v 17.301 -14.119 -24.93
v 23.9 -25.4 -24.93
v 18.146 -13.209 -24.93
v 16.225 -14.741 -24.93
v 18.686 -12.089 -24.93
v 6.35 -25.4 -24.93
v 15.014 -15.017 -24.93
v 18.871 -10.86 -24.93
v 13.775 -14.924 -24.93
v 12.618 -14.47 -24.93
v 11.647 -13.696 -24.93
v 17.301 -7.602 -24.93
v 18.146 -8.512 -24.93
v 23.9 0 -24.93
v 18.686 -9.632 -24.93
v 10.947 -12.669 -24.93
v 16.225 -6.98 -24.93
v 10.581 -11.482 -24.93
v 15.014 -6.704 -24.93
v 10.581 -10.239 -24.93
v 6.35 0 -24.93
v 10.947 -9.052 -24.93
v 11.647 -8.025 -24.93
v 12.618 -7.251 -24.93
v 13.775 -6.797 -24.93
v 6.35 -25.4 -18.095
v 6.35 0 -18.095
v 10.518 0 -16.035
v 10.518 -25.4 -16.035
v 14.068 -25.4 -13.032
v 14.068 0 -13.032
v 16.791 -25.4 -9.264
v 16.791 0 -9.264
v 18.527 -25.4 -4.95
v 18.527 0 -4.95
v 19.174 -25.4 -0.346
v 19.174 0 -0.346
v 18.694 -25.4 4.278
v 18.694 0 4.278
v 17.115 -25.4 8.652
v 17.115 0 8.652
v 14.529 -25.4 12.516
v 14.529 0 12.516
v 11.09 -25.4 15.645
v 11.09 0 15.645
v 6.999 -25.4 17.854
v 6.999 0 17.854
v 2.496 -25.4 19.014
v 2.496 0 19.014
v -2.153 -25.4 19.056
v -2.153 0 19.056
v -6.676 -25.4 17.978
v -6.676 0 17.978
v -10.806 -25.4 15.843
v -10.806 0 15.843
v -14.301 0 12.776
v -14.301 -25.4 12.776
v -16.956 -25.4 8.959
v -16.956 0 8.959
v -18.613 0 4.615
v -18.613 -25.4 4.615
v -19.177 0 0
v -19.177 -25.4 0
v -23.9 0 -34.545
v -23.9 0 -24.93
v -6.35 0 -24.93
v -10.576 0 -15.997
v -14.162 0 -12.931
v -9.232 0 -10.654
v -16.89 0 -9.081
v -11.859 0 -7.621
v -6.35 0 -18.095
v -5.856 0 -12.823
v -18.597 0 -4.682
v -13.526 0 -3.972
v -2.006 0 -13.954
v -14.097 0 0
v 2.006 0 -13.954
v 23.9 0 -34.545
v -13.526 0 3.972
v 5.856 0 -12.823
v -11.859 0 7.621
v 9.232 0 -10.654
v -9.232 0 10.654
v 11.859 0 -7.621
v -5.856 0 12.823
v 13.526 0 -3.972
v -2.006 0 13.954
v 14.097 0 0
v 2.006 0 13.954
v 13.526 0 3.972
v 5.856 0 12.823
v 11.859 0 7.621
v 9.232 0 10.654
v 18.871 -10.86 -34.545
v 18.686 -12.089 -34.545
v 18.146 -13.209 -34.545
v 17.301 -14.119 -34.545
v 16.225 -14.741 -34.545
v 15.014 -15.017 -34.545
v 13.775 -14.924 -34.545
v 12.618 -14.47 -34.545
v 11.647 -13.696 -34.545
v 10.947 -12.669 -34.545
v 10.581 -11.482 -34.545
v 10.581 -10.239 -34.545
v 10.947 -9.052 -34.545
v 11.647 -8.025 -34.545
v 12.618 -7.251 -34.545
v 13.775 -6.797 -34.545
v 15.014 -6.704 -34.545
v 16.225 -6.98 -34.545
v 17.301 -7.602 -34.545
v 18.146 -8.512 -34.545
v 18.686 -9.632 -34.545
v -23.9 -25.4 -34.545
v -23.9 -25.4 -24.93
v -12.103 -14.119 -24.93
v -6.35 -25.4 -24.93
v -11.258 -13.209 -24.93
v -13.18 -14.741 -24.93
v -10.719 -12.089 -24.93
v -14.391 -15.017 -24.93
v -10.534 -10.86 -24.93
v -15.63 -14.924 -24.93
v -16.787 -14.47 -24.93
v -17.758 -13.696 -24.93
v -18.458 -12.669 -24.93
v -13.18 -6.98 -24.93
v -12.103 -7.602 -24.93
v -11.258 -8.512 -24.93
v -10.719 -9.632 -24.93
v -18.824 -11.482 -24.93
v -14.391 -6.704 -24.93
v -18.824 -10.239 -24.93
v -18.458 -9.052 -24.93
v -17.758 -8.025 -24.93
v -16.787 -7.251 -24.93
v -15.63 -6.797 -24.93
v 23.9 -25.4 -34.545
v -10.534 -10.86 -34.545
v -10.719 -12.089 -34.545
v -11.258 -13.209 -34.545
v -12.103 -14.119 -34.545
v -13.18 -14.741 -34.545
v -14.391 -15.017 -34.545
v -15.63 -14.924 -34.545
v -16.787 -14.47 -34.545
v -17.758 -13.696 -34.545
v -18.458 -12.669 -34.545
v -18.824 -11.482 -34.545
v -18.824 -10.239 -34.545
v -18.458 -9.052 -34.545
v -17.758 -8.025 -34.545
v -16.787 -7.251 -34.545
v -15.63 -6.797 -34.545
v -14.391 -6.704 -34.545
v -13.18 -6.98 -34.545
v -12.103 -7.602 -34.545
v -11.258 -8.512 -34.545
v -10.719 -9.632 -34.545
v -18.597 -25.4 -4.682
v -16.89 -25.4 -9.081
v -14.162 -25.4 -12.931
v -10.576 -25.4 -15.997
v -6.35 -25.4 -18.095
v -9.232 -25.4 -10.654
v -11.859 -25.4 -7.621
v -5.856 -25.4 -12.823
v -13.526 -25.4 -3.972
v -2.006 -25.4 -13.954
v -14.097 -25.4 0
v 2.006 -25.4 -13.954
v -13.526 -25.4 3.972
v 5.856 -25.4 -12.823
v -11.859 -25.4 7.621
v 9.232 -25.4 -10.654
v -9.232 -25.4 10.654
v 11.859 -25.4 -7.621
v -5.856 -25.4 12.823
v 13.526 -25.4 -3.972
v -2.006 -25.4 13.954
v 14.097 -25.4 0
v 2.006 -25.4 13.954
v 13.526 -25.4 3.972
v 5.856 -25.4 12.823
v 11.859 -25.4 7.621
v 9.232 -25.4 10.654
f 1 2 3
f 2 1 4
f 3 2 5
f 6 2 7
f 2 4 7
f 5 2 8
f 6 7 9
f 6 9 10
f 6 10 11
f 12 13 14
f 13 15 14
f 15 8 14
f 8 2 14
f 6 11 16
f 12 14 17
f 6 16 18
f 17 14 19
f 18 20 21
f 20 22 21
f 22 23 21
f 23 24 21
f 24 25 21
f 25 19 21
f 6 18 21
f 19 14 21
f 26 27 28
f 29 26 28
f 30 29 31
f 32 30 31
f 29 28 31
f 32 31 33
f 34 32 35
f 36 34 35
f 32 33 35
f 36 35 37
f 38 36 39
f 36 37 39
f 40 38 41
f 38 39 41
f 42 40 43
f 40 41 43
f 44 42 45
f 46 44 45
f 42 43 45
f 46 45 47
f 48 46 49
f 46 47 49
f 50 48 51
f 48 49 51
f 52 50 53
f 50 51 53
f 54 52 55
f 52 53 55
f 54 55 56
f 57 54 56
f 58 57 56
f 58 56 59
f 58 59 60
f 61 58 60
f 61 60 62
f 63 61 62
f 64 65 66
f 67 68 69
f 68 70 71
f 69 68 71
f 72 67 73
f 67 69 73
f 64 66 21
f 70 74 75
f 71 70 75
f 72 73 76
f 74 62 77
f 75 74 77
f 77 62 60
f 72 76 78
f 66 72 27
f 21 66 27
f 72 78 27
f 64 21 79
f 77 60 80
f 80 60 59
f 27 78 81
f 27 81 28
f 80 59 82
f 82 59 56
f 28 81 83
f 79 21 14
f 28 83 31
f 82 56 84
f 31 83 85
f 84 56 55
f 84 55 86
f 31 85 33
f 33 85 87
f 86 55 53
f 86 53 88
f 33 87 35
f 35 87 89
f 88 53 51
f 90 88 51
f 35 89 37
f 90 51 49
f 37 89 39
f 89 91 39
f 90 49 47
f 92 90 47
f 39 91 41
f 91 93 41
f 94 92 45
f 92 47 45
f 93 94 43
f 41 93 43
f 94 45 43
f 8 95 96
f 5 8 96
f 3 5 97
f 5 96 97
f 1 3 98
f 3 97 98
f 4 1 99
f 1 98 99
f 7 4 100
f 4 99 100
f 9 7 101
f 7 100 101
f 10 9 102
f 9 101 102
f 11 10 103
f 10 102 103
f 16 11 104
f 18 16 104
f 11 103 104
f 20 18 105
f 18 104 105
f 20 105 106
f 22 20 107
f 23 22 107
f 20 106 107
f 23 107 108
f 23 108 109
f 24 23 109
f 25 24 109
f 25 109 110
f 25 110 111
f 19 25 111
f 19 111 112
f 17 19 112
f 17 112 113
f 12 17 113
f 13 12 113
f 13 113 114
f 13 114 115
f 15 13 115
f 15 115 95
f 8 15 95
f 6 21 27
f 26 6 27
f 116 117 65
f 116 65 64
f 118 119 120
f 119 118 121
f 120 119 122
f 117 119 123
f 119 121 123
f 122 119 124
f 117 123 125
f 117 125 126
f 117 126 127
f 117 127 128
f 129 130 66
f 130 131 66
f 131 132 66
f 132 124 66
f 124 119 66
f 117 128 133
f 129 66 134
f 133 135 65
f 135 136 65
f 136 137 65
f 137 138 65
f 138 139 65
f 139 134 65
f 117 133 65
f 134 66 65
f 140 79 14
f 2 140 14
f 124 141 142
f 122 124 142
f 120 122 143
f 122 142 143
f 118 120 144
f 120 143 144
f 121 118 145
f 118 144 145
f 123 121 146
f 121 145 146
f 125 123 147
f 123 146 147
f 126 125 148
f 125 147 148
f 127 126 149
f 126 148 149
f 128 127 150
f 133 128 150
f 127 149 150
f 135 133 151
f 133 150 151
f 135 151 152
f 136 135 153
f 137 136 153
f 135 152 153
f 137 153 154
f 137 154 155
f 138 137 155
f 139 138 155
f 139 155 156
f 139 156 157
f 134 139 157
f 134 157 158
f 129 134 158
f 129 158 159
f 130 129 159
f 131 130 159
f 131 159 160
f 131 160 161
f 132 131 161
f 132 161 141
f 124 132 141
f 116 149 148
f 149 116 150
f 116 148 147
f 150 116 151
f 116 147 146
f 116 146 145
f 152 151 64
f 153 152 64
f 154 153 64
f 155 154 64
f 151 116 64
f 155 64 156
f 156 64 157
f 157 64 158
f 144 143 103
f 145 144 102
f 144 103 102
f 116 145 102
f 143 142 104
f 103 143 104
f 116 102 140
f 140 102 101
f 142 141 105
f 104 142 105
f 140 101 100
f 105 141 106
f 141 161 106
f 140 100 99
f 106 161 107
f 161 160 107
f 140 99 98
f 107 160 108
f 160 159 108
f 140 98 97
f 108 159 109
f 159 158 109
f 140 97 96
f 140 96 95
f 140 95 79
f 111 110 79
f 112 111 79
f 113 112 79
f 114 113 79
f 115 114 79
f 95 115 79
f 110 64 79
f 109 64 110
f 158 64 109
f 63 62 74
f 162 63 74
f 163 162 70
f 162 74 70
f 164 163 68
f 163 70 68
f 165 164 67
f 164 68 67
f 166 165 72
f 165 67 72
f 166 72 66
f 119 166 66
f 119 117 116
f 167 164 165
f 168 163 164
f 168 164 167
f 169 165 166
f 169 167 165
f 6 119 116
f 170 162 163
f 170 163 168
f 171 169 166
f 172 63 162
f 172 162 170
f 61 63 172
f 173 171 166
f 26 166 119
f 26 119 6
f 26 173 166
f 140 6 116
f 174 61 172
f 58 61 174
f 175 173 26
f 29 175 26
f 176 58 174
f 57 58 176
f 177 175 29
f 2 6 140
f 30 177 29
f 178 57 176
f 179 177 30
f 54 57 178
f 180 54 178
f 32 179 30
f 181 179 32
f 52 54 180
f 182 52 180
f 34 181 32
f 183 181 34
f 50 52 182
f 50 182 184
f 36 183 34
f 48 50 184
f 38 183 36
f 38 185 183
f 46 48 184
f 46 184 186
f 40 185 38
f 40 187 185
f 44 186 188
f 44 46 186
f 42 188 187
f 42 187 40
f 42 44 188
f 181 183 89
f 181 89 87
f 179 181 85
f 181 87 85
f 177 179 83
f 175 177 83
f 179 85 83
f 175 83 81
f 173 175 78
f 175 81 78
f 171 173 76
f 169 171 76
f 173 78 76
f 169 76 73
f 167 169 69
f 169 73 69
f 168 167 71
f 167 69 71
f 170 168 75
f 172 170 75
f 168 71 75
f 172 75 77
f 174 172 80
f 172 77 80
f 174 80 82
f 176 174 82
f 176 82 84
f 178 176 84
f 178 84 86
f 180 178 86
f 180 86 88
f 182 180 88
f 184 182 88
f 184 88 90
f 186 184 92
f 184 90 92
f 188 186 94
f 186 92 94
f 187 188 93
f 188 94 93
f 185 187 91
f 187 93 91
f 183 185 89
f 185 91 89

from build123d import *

# Parameters (mm, degrees)
F1_DEPTH = 25.4
F2_R     = 4.1683581246
F3_DEPTH = 10.668


# Not quite as in the source:
# - a feature names something its author has since deleted; it is built from what else it names


with BuildPart() as f1:
    # F0 (on Front) → F1 (new body)
    with BuildSketch(Plane.XZ):
        with BuildLine():
            ThreePointArc((6.35, -18.0951603751), (11.0901618338, 15.6449876798), (-19.177, 0))
            ThreePointArc((-19.177, 0), (-15.6449876798, -11.0901618338), (-6.35, -18.0951603751))
            Line((-6.35, -18.0951603751), (-6.35, -24.9301567674))
            Line((-6.35, -24.9301567674), (-23.899981752, -24.9301567674))
            Line((-23.899981752, -24.9301567674), (-23.899981752, -34.5450900495))
            Line((-23.899981752, -34.5450900495), (23.899981752, -34.5450900495))
            Line((23.899981752, -34.5450900495), (23.899981752, -24.9301567674))
            Line((23.899981752, -24.9301567674), (6.35, -24.9301567674))
            Line((6.35, -24.9301567674), (6.35, -18.0951603751))
        make_face()
        with BuildLine():
            ThreePointArc((-14.097, 0), (0, 14.097), (14.097, 0))
            ThreePointArc((14.097, 0), (0, -14.097), (-14.097, 0))
        make_face(mode=Mode.SUBTRACT)
    extrude(amount=F1_DEPTH)

    # F2 (on face) → F3 (cut)
    with BuildSketch(Plane(origin=(0, 0, -34.5450900495), x_dir=(1, 0, 0), z_dir=(0, 0, -1))):
        with Locations((-14.7024132311, 10.8604691923)):
            Circle(F2_R)
        with Locations((14.7024132311, 10.8604691923)):
            Circle(F2_R)
    extrude(amount=-F3_DEPTH, mode=Mode.SUBTRACT)


solid = f1.part
